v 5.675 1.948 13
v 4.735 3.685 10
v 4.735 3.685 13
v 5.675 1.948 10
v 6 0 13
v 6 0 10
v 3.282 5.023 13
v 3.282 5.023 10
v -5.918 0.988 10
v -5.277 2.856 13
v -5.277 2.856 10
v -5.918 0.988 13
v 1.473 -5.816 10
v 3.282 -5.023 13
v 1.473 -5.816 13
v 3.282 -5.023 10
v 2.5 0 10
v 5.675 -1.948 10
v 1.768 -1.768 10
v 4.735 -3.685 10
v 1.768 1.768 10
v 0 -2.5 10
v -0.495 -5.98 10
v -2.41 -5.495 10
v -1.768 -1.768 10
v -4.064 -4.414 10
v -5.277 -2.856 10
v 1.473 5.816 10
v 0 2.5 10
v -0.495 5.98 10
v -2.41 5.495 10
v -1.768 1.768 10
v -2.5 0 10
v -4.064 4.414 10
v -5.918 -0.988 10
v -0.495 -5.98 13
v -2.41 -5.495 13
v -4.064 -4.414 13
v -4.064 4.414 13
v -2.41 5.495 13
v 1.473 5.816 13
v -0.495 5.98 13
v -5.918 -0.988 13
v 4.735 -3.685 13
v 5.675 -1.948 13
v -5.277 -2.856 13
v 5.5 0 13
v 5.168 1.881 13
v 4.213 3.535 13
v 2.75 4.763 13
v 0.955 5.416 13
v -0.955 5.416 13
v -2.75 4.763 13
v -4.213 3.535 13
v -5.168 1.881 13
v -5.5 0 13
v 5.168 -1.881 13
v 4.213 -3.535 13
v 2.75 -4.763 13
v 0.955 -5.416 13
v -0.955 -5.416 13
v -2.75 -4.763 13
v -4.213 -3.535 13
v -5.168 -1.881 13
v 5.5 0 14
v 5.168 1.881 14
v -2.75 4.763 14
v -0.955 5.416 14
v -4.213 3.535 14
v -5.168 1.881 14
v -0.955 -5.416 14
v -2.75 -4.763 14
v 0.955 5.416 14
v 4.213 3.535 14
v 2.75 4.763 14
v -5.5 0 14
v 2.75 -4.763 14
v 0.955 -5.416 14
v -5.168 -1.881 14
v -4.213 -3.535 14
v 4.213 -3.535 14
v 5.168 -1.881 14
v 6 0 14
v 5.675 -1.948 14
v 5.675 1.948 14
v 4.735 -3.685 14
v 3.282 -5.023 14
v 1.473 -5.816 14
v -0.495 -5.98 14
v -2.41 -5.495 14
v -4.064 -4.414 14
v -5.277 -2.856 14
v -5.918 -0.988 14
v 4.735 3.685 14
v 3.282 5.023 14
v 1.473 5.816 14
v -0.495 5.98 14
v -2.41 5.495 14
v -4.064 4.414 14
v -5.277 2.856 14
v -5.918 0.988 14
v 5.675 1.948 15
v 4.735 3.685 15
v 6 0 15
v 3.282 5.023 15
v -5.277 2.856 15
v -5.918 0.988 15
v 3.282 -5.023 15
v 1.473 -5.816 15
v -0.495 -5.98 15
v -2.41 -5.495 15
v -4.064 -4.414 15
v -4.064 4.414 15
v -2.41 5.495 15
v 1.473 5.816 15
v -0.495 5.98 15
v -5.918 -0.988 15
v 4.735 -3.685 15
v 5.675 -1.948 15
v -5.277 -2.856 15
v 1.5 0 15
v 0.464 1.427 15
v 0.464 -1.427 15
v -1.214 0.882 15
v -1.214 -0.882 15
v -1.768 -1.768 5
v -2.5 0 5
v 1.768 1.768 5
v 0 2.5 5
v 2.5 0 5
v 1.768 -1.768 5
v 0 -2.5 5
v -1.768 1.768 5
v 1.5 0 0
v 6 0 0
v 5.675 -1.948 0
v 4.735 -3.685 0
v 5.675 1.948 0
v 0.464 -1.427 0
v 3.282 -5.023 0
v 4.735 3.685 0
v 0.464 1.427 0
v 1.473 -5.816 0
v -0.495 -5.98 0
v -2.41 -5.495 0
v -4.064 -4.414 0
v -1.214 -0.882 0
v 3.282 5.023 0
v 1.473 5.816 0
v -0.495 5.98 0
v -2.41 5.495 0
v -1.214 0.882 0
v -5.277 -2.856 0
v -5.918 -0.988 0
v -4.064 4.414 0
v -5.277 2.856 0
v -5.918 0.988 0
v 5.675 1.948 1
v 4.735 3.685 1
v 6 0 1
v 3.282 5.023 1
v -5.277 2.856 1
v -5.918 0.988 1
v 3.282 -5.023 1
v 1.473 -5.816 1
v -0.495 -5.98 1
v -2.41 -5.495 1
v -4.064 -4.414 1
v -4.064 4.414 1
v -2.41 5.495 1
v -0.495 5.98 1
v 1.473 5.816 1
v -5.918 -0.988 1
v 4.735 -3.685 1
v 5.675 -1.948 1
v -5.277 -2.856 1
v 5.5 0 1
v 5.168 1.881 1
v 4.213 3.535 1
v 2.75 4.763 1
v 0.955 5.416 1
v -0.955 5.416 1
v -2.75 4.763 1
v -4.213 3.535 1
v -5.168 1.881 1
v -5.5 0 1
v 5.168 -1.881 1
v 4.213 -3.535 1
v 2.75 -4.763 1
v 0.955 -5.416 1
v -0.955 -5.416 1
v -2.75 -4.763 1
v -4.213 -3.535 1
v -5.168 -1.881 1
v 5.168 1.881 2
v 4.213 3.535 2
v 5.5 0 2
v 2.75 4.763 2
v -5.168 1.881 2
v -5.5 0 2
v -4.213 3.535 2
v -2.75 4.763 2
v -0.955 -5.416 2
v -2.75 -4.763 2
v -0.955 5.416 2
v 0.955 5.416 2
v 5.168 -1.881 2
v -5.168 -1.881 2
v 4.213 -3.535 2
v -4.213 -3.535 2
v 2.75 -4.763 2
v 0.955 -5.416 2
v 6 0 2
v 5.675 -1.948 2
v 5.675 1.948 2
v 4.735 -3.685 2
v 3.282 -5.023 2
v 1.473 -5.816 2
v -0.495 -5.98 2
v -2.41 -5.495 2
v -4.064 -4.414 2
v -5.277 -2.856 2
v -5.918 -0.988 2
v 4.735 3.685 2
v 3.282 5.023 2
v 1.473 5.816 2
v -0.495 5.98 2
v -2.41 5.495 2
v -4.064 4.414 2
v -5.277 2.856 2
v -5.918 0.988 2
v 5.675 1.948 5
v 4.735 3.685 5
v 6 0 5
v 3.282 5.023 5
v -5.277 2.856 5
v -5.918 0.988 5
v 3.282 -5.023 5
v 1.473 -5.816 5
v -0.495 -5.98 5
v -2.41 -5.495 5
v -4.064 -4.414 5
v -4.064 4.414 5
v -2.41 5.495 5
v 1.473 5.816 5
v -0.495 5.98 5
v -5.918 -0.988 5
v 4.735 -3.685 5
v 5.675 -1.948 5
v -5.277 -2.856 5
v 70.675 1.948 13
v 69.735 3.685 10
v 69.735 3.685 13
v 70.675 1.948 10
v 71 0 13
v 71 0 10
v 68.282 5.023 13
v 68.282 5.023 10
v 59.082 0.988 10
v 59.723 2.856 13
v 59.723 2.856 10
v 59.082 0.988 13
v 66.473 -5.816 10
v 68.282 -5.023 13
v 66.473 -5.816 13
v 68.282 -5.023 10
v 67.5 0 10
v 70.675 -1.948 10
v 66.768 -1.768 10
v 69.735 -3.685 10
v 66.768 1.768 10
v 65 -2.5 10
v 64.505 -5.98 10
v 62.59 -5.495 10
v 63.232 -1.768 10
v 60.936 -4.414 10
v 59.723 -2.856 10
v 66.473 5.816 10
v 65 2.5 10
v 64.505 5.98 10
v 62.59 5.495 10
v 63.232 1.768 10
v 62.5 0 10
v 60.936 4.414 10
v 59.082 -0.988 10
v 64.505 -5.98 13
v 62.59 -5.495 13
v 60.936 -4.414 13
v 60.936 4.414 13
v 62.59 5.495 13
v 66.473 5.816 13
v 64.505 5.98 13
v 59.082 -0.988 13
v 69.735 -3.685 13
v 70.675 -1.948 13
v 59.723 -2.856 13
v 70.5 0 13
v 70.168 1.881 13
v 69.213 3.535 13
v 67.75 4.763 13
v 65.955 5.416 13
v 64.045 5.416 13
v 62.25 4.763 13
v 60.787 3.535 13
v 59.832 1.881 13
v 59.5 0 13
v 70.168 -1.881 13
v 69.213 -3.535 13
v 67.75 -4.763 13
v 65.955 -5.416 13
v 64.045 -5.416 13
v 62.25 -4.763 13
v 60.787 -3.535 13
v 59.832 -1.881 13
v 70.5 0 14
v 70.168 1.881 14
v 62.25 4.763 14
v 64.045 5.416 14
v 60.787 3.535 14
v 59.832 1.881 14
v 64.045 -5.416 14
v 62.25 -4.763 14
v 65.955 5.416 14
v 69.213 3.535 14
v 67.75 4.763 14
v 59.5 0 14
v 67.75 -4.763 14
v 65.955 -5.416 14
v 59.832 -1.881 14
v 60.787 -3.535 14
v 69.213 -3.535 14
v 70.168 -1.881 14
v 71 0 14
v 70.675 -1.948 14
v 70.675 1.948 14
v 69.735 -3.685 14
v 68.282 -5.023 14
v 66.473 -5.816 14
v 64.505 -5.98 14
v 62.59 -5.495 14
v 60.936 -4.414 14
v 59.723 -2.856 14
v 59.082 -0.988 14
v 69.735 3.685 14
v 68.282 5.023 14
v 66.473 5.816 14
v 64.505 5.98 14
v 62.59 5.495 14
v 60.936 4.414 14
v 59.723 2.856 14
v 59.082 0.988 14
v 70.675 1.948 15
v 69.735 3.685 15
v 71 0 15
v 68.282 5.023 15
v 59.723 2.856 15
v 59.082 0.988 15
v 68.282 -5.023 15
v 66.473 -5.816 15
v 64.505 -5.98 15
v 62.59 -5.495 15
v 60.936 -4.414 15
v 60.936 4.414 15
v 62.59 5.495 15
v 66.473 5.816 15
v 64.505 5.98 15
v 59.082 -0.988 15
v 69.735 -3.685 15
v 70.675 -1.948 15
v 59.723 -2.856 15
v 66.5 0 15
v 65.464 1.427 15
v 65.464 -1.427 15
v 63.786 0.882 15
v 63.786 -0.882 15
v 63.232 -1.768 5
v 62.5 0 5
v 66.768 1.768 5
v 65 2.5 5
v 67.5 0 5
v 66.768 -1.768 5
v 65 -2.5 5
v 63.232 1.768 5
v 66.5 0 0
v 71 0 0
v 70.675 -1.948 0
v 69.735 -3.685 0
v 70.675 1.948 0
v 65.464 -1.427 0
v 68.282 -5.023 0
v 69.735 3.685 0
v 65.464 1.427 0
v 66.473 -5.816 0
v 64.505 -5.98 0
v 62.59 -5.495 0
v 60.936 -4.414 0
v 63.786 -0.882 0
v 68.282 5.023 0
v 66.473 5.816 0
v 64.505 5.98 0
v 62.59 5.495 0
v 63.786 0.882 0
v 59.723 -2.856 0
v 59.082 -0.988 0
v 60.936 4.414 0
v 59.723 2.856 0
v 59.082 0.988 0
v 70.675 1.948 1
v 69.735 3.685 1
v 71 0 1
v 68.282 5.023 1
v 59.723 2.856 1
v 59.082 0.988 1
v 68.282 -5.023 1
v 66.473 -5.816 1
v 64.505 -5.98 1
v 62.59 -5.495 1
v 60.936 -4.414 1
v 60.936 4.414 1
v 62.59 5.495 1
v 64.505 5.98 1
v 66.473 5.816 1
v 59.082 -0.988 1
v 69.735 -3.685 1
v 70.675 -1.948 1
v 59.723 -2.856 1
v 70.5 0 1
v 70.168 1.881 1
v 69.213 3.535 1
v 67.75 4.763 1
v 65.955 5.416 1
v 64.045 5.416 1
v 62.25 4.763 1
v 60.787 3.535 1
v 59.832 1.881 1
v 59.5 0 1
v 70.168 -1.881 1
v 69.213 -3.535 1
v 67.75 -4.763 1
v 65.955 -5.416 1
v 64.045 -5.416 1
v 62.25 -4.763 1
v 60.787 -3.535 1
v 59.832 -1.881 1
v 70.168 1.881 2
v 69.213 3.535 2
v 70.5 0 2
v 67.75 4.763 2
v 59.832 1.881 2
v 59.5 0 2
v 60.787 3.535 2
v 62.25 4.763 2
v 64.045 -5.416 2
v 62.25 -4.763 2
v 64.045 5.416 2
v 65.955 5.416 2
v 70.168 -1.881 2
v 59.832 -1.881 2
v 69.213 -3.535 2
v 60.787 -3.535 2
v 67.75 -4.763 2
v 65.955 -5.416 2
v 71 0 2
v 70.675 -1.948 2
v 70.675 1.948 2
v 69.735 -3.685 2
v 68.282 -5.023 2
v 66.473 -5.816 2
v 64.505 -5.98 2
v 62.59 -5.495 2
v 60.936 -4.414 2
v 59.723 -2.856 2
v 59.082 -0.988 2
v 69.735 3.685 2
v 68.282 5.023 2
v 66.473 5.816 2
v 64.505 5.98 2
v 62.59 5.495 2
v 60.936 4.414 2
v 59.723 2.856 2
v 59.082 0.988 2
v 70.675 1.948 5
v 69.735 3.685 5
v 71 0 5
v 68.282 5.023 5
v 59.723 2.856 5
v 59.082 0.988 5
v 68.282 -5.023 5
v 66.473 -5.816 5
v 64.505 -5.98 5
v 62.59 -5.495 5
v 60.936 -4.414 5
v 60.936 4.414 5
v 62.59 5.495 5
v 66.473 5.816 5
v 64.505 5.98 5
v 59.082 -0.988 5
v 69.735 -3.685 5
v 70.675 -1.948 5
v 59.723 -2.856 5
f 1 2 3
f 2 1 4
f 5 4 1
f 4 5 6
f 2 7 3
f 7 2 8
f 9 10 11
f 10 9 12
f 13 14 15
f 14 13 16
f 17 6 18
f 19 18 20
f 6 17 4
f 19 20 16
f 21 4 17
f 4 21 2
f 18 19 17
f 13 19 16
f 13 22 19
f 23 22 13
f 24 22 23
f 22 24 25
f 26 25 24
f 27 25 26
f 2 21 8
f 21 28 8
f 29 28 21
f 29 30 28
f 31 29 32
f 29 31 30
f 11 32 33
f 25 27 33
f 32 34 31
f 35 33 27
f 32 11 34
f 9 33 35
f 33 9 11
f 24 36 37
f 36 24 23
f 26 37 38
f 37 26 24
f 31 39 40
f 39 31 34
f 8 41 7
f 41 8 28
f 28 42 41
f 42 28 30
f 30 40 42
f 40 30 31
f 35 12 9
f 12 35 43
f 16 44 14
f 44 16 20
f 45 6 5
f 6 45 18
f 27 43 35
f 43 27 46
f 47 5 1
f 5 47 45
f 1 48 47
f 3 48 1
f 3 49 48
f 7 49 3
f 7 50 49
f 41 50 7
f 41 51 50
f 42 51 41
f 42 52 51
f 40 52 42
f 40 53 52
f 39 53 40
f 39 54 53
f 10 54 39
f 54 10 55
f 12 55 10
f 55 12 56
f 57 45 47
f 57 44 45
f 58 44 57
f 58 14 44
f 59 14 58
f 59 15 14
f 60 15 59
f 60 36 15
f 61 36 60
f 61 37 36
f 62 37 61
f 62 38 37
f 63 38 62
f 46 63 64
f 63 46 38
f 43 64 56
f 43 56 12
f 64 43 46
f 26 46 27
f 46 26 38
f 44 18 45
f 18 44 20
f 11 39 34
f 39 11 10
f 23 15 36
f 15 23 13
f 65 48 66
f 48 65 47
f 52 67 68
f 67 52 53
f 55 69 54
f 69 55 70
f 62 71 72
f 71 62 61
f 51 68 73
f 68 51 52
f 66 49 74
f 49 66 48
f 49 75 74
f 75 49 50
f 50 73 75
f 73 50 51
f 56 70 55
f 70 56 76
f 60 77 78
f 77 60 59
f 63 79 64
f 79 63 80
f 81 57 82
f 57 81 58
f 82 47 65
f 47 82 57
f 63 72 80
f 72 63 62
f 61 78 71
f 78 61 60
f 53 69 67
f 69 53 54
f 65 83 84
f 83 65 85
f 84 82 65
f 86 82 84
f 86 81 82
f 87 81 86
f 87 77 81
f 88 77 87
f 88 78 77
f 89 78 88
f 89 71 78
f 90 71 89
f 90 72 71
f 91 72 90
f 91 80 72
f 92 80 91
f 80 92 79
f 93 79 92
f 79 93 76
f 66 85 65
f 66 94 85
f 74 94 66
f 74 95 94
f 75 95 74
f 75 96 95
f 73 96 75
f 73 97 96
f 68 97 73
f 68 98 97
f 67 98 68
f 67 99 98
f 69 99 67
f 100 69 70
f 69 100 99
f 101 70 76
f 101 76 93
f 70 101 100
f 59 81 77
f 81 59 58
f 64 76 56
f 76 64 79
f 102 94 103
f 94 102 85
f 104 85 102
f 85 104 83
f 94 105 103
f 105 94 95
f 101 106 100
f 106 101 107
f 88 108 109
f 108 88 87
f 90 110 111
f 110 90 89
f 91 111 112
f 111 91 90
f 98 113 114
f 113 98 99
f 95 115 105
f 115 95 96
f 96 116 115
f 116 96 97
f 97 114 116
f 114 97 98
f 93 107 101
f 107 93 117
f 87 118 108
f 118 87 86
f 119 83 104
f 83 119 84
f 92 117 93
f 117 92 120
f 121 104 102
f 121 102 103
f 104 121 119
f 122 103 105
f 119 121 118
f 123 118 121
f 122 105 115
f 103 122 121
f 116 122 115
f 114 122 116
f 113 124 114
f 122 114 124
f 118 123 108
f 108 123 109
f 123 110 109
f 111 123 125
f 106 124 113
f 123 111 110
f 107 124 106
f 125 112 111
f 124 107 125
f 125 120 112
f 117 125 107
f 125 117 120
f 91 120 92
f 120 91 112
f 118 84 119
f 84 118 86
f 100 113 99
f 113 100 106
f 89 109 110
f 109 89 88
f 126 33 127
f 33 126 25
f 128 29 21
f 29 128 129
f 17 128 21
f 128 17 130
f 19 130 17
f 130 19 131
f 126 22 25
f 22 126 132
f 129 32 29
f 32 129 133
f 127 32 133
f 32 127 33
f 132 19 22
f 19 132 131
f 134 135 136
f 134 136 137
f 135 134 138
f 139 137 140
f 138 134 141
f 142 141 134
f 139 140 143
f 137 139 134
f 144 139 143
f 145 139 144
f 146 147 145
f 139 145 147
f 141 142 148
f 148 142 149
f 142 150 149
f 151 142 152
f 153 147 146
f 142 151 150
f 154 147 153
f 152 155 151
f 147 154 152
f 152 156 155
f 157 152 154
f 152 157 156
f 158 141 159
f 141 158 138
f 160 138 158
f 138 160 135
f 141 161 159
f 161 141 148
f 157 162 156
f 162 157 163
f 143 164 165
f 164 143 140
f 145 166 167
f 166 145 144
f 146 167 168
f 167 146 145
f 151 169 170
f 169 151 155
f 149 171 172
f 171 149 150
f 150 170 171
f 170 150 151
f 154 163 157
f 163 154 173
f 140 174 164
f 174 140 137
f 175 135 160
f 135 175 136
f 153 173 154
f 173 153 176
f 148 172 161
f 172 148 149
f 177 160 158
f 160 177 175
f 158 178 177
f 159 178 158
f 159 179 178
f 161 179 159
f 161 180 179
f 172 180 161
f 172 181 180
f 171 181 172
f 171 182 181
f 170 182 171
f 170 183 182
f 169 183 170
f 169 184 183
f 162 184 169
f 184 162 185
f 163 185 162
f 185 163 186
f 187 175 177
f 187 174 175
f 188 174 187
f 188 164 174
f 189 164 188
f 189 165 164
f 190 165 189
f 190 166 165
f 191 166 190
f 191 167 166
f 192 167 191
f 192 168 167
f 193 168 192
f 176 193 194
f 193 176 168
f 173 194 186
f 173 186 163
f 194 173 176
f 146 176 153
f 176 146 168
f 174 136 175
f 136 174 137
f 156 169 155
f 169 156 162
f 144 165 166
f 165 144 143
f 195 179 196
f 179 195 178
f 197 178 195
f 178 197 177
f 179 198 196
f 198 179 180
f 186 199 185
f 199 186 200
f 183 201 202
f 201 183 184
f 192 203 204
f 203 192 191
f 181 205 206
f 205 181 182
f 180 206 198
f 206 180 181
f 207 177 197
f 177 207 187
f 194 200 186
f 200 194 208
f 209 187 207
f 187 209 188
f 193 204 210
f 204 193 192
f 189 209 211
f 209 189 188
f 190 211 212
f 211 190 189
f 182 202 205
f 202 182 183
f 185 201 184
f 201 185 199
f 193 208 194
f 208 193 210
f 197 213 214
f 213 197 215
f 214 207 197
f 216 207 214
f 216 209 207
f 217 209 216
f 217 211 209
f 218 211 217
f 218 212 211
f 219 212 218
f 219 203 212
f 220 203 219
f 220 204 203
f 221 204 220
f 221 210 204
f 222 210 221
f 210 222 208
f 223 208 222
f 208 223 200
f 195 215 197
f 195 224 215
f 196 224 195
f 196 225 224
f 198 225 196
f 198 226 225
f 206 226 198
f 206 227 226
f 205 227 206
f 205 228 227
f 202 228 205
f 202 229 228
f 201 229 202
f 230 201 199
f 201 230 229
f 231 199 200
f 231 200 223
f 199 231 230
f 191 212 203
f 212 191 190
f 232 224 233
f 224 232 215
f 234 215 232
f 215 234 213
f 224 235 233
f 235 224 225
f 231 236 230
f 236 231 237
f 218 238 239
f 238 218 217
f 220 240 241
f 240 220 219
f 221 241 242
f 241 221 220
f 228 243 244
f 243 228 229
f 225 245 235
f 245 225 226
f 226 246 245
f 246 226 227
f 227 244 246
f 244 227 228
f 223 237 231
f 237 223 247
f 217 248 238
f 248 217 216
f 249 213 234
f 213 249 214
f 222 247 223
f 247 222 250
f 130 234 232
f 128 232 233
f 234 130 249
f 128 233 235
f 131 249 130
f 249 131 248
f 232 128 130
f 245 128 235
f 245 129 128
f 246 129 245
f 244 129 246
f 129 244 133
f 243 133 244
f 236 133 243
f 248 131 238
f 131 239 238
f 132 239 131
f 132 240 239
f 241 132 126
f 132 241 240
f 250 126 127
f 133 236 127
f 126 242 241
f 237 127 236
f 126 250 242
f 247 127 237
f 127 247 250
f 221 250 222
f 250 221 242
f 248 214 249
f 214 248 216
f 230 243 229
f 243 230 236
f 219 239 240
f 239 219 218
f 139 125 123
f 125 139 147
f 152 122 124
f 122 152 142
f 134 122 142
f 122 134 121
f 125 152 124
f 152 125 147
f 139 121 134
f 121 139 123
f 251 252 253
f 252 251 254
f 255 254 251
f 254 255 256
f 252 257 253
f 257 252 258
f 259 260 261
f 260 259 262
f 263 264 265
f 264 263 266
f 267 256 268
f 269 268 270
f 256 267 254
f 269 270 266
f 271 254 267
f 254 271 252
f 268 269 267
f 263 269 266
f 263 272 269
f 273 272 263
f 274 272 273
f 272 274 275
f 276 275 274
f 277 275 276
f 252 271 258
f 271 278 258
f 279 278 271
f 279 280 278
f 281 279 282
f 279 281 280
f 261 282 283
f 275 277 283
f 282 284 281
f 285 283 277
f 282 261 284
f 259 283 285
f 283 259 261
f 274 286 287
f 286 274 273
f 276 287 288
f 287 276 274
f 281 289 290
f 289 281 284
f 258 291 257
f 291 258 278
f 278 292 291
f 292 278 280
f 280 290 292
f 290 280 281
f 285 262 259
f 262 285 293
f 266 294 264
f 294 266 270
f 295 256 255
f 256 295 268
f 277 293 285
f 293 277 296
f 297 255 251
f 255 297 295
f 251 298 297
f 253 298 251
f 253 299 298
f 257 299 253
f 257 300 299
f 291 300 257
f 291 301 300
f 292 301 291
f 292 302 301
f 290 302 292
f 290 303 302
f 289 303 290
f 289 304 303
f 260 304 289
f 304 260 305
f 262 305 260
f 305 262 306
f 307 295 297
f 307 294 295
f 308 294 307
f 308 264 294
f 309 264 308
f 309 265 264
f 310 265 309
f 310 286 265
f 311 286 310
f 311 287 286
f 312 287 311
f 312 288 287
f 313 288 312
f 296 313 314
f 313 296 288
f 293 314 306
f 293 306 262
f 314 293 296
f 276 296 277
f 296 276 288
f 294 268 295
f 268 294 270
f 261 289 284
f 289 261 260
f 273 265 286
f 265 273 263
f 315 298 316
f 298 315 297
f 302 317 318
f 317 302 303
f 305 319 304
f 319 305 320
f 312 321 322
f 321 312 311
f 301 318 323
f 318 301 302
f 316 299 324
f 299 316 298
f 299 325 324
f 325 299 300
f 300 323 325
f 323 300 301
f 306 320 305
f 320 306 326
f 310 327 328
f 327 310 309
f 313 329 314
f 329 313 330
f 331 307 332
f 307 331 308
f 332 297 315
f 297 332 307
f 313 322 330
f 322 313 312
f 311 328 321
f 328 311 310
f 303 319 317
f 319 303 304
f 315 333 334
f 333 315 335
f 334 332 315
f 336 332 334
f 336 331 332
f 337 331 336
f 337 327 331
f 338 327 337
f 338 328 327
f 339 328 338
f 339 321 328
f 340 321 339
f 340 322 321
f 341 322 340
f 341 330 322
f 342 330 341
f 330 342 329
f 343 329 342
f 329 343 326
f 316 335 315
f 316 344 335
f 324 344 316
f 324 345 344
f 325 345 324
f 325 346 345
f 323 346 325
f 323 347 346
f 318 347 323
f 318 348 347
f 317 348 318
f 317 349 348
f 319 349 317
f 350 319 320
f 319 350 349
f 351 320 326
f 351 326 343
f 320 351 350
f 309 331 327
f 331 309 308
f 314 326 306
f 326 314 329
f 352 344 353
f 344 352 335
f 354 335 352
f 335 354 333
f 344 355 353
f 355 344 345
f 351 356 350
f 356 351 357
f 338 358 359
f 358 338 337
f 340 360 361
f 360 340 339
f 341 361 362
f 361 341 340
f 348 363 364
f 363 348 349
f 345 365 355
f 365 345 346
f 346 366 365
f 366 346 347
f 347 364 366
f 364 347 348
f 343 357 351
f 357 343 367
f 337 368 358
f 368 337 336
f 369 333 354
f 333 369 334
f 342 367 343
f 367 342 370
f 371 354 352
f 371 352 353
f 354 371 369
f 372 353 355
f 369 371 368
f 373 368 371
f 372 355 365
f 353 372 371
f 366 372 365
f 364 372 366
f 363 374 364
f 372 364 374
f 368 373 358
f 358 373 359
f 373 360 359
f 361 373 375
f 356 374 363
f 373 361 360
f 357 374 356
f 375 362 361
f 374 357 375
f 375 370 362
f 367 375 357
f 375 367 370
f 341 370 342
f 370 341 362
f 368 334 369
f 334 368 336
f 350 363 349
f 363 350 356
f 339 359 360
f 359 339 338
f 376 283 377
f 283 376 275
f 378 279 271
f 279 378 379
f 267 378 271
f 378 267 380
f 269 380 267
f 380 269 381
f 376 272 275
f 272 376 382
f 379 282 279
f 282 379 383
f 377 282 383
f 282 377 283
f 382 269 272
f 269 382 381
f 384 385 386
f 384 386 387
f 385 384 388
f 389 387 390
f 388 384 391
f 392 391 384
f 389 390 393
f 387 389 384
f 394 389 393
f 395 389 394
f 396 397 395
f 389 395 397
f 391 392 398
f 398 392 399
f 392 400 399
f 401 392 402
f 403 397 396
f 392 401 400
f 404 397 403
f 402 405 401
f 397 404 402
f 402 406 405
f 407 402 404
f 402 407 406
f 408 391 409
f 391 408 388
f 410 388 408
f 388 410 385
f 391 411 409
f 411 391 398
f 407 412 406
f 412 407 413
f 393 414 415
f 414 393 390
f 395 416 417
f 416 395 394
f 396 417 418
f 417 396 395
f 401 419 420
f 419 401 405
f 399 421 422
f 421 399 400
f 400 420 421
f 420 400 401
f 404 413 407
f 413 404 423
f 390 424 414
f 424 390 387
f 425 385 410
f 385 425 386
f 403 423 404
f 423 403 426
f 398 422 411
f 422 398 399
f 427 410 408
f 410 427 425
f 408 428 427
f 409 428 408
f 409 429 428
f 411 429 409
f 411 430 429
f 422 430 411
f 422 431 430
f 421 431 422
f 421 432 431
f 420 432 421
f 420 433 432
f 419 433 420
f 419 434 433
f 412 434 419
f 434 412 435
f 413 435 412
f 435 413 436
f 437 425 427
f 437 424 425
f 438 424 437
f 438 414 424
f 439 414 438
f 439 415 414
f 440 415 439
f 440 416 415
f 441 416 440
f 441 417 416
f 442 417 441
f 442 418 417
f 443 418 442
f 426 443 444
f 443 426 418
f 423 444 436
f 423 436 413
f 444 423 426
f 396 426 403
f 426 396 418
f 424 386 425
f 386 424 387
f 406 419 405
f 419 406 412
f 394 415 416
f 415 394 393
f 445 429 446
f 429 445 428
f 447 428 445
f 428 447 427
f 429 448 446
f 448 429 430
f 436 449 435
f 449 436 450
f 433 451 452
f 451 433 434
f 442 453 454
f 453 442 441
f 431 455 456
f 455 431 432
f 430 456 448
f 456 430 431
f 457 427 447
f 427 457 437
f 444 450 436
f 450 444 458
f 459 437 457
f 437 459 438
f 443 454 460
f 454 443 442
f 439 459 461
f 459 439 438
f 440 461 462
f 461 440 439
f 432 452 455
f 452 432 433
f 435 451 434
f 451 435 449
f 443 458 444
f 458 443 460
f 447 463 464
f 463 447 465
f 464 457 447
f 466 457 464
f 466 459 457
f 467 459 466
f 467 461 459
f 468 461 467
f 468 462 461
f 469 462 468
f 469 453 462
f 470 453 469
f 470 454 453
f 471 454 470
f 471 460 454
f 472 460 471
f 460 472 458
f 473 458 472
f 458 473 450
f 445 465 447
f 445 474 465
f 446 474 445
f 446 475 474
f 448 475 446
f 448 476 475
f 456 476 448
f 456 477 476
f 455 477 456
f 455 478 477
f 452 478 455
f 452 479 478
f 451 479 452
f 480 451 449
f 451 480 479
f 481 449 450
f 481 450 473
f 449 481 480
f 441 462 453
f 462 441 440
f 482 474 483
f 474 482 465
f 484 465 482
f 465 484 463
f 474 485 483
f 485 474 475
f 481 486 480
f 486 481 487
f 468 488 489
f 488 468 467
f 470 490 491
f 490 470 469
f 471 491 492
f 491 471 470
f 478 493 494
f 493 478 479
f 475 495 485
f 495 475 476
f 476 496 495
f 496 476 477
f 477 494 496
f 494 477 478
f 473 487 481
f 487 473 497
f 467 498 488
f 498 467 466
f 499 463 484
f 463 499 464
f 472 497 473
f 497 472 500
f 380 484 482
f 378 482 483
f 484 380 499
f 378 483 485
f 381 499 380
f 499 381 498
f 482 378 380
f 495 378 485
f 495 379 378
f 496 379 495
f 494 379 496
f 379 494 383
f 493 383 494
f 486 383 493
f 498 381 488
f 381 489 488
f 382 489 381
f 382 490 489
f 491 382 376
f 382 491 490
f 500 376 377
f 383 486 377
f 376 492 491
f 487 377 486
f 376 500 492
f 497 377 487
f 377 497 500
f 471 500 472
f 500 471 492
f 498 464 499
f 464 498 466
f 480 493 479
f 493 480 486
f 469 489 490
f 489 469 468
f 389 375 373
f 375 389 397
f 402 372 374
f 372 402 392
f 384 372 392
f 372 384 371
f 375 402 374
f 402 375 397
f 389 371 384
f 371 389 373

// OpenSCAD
difference() {

    union() {
        
        
        cylinder(h = 15, d = 5, center = false);
        
    
        cylinder(h = 1, d = 12, center = false);
        translate([0,0,1]){
            cylinder(h = 1, d = 11, center = false);
            };
        translate([0,0,2]){
            cylinder(h = 3, d = 12, center = false);
            };
            
            translate([0,0,10]){
                    cylinder(h = 3, d = 12, center = false);
                    translate([0,0,3]){
                        cylinder(h = 1, d = 11, center = false);
                            };
                    translate([0,0,4]){
                    cylinder(h = 1, d = 12, center = false);
                    };
            }           
    };
cylinder(h = 15, d = 3, center = false);
    
};

translate([65,0,0]) {
difference() {

    union() {
        
        
        cylinder(h = 15, d = 5, center = false);
        
    
        cylinder(h = 1, d = 12, center = false);
        translate([0,0,1]){
            cylinder(h = 1, d = 11, center = false);
            };
        translate([0,0,2]){
            cylinder(h = 3, d = 12, center = false);
            };
            
            translate([0,0,10]){
                    cylinder(h = 3, d = 12, center = false);
                    translate([0,0,3]){
                        cylinder(h = 1, d = 11, center = false);
                            };
                    translate([0,0,4]){
                    cylinder(h = 1, d = 12, center = false);
                    };
            }           
    };
cylinder(h = 15, d = 3, center = false);
    
};
};




   


    
